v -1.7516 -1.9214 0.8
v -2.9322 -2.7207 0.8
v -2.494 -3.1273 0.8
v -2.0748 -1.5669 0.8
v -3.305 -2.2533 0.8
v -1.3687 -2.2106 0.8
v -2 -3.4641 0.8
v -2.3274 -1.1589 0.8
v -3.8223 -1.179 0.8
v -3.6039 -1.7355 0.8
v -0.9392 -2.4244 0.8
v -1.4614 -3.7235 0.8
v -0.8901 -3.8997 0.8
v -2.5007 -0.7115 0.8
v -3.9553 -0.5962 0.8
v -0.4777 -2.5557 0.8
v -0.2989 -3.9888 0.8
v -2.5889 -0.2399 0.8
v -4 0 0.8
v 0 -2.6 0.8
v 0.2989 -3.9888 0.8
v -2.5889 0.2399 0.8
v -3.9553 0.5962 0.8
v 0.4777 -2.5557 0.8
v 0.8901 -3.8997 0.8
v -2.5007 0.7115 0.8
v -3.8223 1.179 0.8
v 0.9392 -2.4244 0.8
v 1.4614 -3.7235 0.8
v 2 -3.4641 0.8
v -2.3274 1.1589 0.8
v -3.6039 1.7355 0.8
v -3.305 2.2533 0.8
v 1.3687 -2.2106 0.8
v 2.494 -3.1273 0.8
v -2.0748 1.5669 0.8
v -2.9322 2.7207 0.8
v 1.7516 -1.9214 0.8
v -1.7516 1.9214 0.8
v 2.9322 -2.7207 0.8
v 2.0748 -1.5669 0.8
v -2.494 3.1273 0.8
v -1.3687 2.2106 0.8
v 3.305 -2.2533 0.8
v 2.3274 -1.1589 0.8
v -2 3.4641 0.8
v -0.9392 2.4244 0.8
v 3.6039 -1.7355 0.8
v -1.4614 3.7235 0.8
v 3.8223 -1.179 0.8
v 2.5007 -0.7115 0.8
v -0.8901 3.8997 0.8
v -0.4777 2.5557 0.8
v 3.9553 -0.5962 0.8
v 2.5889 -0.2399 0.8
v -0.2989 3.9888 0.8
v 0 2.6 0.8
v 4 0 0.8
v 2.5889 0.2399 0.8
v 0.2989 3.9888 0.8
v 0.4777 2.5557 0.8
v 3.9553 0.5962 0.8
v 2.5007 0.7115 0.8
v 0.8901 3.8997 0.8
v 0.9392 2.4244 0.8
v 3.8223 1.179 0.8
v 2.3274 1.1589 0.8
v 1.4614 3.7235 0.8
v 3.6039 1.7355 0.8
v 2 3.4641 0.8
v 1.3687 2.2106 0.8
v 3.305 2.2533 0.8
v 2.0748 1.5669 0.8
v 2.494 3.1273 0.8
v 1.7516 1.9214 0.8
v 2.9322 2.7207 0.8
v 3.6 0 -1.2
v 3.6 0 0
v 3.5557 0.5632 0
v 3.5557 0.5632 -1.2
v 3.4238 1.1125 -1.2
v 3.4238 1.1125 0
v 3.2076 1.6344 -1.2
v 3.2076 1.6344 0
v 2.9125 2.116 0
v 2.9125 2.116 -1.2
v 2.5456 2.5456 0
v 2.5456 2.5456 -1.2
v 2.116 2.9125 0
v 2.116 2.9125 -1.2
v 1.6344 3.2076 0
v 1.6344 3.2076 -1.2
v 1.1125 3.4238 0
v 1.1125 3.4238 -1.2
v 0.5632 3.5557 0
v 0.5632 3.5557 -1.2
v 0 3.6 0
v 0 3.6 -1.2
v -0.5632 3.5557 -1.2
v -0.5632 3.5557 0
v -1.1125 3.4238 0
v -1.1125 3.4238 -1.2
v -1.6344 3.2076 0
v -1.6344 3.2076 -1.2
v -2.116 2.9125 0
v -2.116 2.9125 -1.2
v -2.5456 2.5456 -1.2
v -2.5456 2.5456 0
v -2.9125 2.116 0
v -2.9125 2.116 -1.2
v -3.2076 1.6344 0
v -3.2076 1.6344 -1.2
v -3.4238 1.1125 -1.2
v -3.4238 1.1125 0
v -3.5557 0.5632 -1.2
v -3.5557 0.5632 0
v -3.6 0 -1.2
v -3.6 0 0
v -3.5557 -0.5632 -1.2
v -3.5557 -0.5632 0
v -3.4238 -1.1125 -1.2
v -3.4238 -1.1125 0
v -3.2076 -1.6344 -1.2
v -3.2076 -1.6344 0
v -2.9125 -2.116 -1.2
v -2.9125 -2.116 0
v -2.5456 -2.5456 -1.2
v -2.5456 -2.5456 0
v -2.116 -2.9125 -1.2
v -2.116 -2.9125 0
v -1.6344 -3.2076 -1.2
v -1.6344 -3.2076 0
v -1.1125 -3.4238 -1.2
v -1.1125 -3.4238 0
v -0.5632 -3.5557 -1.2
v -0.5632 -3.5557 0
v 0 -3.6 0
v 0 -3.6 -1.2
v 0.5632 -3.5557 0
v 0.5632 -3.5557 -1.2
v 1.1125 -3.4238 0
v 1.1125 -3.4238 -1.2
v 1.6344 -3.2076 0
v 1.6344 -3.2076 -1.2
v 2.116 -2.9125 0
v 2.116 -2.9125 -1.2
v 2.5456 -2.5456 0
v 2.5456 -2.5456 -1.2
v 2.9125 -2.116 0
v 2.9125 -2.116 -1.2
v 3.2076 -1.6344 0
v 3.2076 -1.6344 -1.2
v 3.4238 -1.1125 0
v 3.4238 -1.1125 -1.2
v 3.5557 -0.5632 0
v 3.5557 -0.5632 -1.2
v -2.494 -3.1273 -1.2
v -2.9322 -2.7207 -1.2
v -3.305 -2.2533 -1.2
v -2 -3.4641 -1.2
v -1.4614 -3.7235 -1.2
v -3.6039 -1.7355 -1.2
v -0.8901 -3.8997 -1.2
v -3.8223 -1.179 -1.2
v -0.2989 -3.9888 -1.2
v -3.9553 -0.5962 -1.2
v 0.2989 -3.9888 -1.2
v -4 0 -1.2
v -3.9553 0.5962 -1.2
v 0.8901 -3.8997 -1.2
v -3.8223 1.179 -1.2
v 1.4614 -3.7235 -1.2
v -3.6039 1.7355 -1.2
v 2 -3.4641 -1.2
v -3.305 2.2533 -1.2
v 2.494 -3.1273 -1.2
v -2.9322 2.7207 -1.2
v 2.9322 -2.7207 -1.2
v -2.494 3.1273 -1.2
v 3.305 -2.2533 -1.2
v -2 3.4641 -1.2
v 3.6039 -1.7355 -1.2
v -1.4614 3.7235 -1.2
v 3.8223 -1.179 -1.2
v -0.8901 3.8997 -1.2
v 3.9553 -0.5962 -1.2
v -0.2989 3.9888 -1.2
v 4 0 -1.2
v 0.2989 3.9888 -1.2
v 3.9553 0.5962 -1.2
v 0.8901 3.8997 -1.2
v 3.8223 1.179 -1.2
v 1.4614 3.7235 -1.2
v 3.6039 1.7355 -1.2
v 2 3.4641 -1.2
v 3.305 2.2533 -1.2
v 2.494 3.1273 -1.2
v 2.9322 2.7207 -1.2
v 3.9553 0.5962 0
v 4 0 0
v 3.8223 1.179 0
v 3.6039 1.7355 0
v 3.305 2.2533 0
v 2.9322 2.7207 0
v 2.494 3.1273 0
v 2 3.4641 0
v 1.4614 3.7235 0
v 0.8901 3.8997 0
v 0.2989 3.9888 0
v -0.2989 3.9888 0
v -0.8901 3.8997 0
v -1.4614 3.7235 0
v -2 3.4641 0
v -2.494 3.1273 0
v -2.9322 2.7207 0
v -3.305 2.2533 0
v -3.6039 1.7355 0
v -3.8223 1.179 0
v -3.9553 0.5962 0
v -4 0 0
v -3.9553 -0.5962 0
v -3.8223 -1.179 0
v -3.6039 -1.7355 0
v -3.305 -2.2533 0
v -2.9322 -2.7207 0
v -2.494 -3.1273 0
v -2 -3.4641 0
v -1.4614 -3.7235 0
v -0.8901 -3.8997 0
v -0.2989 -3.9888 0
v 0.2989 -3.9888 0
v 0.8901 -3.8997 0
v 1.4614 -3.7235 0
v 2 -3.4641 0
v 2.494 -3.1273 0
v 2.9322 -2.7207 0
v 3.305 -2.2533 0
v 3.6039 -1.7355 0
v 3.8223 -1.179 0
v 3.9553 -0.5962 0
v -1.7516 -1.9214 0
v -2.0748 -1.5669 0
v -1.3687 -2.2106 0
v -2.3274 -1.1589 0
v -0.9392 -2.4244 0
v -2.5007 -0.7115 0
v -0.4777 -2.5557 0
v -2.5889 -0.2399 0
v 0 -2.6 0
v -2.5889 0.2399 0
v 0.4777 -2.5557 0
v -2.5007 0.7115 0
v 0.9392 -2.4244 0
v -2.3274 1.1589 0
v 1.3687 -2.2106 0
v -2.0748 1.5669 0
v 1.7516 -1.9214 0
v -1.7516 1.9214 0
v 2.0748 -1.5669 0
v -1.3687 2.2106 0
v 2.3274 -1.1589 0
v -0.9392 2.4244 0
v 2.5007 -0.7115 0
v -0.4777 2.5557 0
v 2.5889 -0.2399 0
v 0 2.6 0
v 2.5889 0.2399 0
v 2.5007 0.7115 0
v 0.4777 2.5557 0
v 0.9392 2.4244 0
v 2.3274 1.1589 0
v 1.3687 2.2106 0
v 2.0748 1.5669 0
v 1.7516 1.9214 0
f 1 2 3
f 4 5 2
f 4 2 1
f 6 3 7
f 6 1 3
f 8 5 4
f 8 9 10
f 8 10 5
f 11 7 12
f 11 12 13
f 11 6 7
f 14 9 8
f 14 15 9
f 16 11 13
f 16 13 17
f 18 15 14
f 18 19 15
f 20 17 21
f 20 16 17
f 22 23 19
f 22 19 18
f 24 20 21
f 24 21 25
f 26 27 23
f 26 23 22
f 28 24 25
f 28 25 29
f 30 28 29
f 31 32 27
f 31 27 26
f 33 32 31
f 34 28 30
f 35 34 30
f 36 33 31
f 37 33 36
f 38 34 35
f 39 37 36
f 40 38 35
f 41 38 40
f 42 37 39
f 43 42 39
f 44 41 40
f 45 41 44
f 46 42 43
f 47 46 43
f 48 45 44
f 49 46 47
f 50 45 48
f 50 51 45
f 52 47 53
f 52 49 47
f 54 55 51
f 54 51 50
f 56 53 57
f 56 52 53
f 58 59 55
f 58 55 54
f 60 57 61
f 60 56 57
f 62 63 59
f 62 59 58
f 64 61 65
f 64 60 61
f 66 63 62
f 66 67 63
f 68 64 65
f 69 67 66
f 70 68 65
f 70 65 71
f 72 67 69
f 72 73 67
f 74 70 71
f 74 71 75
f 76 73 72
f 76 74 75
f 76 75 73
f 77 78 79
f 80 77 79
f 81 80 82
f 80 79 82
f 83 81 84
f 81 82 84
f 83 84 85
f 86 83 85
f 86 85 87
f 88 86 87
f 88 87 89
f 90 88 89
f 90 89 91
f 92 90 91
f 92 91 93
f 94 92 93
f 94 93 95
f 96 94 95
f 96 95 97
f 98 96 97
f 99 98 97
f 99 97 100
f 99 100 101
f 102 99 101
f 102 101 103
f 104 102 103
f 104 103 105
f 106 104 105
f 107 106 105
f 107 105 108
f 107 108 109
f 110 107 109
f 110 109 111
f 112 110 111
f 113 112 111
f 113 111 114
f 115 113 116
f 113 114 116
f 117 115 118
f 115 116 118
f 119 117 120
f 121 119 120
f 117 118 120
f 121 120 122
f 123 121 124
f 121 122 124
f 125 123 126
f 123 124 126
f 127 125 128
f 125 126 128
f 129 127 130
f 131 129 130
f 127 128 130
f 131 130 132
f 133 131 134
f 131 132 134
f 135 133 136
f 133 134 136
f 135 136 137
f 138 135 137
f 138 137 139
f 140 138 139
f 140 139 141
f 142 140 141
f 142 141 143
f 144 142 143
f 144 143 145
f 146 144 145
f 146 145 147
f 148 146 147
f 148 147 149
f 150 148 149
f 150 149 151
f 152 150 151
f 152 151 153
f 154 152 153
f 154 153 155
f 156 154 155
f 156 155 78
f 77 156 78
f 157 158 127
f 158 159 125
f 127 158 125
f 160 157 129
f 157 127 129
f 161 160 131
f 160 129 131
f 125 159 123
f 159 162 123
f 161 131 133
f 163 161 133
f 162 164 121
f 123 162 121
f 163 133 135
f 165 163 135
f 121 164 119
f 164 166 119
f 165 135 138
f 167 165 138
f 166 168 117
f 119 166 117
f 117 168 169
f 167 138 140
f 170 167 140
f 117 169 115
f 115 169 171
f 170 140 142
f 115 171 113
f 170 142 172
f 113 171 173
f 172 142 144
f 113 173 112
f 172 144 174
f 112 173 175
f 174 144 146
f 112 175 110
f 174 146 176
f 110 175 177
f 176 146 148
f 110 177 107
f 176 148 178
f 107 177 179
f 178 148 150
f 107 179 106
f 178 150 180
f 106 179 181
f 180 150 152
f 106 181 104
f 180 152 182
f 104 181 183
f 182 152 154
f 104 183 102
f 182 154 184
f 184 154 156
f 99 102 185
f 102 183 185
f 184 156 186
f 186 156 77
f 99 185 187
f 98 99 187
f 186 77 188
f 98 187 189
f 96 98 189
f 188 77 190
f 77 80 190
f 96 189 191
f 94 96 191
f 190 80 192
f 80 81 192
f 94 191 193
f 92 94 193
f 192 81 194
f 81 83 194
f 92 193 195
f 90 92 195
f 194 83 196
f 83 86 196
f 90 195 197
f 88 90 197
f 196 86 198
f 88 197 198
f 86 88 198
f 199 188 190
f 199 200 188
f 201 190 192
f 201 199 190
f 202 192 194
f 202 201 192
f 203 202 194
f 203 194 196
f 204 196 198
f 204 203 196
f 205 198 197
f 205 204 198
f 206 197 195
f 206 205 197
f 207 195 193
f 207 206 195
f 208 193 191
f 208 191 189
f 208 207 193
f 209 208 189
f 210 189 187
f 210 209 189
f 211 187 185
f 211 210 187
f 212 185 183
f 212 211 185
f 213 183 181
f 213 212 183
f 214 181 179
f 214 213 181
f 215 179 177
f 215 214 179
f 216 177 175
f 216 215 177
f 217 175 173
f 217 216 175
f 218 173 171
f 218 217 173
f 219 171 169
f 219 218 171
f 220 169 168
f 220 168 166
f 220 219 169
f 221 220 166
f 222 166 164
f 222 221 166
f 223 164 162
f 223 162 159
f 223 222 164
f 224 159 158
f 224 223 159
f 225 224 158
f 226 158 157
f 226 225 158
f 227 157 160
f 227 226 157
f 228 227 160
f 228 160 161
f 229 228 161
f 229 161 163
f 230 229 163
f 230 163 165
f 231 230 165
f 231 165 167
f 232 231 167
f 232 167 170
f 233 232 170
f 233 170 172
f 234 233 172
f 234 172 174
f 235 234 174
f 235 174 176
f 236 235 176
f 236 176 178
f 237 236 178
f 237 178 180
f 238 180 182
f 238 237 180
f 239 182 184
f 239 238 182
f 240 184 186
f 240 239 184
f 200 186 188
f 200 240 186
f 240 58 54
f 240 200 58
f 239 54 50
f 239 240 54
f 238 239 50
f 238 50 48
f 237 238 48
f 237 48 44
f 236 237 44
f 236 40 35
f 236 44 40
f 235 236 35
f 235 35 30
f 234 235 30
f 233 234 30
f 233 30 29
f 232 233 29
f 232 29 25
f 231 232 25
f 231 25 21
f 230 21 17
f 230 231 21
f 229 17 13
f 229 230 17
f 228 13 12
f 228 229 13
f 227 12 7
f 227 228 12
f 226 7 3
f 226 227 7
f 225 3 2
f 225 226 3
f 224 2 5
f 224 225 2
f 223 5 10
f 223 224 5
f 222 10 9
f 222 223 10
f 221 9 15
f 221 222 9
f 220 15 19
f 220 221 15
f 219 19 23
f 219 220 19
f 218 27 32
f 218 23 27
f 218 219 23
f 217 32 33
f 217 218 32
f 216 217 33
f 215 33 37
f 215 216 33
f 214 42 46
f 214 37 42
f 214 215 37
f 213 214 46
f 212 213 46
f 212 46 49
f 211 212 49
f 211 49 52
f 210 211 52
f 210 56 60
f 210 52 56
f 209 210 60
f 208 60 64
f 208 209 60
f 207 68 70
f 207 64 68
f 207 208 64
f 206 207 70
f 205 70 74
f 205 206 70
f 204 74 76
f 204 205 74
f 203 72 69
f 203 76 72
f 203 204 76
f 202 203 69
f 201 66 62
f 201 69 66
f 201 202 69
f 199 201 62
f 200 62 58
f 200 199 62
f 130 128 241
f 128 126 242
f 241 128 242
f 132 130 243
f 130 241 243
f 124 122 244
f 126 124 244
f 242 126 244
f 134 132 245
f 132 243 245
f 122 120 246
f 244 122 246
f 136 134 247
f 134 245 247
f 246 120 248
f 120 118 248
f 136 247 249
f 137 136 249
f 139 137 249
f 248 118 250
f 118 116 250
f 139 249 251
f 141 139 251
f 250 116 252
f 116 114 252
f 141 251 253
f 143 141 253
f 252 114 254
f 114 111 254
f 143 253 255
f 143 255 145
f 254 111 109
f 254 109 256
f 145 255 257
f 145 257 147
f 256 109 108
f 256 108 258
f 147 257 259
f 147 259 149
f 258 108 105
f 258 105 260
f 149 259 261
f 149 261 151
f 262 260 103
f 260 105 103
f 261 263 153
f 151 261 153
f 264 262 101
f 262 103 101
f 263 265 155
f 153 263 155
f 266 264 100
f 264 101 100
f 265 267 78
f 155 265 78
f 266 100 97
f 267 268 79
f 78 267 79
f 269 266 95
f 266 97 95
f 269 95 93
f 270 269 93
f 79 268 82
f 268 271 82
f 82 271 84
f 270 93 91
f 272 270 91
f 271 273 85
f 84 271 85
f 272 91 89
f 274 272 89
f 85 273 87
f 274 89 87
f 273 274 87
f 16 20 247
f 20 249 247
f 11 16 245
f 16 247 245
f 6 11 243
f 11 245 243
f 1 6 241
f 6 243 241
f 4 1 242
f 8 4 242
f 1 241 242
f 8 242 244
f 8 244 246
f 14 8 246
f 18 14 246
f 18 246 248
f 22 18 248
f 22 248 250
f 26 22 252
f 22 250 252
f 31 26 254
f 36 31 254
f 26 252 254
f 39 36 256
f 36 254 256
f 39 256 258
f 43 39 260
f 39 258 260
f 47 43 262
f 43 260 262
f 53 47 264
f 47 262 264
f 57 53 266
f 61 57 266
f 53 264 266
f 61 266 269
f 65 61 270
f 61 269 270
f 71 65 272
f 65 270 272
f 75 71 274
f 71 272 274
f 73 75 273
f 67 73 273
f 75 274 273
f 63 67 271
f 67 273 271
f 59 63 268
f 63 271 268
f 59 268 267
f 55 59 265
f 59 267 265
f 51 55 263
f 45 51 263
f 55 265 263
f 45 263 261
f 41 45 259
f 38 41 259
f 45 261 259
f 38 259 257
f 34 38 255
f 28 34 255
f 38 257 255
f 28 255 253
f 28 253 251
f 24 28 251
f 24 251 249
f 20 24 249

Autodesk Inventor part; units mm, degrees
ref_plane "YZ Plane" through (0, 0, 0) normal (1, 0, 0) x (0, 1, 0)
ref_plane "XZ Plane" through (0, 0, 0) normal (0, 1, 0) x (-1, 0, 0)
ref_plane "XY Plane" through (0, 0, 0) normal (0, 0, 1) x (1, 0, 0)
sketch "Sketch1" plane through (0, 0, 0) normal (0, 0, 1) x (1, 0, 0)
  circle A0 centre (0, 0) radius 4
  dimension "d0" = 8
extrude "Extrusion1" add sketch "Sketch1" along normal blind 0.8
sketch "Sketch2" plane through (0, 0, 0) normal (0, 0, 1) x (1, 0, 0)
  circle A0 centre (0, 0) radius 3.6
  circle A1 centre (0, 0) radius 4 projected
  dimension "d3" = 7.2
extrude "Extrusion2" add sketch "Sketch2" against normal blind 1.2
sketch "Sketch3" plane through (0, 0, 0.8) normal (0, 0, 1) x (1, 0, 0)
  point P0 (0, 0)
hole "Hole1" at (0, 0, 0.8) direction (0, 0, -1) diameter 5.2 end through all
properties part number "LabyrinthSealOuter"
